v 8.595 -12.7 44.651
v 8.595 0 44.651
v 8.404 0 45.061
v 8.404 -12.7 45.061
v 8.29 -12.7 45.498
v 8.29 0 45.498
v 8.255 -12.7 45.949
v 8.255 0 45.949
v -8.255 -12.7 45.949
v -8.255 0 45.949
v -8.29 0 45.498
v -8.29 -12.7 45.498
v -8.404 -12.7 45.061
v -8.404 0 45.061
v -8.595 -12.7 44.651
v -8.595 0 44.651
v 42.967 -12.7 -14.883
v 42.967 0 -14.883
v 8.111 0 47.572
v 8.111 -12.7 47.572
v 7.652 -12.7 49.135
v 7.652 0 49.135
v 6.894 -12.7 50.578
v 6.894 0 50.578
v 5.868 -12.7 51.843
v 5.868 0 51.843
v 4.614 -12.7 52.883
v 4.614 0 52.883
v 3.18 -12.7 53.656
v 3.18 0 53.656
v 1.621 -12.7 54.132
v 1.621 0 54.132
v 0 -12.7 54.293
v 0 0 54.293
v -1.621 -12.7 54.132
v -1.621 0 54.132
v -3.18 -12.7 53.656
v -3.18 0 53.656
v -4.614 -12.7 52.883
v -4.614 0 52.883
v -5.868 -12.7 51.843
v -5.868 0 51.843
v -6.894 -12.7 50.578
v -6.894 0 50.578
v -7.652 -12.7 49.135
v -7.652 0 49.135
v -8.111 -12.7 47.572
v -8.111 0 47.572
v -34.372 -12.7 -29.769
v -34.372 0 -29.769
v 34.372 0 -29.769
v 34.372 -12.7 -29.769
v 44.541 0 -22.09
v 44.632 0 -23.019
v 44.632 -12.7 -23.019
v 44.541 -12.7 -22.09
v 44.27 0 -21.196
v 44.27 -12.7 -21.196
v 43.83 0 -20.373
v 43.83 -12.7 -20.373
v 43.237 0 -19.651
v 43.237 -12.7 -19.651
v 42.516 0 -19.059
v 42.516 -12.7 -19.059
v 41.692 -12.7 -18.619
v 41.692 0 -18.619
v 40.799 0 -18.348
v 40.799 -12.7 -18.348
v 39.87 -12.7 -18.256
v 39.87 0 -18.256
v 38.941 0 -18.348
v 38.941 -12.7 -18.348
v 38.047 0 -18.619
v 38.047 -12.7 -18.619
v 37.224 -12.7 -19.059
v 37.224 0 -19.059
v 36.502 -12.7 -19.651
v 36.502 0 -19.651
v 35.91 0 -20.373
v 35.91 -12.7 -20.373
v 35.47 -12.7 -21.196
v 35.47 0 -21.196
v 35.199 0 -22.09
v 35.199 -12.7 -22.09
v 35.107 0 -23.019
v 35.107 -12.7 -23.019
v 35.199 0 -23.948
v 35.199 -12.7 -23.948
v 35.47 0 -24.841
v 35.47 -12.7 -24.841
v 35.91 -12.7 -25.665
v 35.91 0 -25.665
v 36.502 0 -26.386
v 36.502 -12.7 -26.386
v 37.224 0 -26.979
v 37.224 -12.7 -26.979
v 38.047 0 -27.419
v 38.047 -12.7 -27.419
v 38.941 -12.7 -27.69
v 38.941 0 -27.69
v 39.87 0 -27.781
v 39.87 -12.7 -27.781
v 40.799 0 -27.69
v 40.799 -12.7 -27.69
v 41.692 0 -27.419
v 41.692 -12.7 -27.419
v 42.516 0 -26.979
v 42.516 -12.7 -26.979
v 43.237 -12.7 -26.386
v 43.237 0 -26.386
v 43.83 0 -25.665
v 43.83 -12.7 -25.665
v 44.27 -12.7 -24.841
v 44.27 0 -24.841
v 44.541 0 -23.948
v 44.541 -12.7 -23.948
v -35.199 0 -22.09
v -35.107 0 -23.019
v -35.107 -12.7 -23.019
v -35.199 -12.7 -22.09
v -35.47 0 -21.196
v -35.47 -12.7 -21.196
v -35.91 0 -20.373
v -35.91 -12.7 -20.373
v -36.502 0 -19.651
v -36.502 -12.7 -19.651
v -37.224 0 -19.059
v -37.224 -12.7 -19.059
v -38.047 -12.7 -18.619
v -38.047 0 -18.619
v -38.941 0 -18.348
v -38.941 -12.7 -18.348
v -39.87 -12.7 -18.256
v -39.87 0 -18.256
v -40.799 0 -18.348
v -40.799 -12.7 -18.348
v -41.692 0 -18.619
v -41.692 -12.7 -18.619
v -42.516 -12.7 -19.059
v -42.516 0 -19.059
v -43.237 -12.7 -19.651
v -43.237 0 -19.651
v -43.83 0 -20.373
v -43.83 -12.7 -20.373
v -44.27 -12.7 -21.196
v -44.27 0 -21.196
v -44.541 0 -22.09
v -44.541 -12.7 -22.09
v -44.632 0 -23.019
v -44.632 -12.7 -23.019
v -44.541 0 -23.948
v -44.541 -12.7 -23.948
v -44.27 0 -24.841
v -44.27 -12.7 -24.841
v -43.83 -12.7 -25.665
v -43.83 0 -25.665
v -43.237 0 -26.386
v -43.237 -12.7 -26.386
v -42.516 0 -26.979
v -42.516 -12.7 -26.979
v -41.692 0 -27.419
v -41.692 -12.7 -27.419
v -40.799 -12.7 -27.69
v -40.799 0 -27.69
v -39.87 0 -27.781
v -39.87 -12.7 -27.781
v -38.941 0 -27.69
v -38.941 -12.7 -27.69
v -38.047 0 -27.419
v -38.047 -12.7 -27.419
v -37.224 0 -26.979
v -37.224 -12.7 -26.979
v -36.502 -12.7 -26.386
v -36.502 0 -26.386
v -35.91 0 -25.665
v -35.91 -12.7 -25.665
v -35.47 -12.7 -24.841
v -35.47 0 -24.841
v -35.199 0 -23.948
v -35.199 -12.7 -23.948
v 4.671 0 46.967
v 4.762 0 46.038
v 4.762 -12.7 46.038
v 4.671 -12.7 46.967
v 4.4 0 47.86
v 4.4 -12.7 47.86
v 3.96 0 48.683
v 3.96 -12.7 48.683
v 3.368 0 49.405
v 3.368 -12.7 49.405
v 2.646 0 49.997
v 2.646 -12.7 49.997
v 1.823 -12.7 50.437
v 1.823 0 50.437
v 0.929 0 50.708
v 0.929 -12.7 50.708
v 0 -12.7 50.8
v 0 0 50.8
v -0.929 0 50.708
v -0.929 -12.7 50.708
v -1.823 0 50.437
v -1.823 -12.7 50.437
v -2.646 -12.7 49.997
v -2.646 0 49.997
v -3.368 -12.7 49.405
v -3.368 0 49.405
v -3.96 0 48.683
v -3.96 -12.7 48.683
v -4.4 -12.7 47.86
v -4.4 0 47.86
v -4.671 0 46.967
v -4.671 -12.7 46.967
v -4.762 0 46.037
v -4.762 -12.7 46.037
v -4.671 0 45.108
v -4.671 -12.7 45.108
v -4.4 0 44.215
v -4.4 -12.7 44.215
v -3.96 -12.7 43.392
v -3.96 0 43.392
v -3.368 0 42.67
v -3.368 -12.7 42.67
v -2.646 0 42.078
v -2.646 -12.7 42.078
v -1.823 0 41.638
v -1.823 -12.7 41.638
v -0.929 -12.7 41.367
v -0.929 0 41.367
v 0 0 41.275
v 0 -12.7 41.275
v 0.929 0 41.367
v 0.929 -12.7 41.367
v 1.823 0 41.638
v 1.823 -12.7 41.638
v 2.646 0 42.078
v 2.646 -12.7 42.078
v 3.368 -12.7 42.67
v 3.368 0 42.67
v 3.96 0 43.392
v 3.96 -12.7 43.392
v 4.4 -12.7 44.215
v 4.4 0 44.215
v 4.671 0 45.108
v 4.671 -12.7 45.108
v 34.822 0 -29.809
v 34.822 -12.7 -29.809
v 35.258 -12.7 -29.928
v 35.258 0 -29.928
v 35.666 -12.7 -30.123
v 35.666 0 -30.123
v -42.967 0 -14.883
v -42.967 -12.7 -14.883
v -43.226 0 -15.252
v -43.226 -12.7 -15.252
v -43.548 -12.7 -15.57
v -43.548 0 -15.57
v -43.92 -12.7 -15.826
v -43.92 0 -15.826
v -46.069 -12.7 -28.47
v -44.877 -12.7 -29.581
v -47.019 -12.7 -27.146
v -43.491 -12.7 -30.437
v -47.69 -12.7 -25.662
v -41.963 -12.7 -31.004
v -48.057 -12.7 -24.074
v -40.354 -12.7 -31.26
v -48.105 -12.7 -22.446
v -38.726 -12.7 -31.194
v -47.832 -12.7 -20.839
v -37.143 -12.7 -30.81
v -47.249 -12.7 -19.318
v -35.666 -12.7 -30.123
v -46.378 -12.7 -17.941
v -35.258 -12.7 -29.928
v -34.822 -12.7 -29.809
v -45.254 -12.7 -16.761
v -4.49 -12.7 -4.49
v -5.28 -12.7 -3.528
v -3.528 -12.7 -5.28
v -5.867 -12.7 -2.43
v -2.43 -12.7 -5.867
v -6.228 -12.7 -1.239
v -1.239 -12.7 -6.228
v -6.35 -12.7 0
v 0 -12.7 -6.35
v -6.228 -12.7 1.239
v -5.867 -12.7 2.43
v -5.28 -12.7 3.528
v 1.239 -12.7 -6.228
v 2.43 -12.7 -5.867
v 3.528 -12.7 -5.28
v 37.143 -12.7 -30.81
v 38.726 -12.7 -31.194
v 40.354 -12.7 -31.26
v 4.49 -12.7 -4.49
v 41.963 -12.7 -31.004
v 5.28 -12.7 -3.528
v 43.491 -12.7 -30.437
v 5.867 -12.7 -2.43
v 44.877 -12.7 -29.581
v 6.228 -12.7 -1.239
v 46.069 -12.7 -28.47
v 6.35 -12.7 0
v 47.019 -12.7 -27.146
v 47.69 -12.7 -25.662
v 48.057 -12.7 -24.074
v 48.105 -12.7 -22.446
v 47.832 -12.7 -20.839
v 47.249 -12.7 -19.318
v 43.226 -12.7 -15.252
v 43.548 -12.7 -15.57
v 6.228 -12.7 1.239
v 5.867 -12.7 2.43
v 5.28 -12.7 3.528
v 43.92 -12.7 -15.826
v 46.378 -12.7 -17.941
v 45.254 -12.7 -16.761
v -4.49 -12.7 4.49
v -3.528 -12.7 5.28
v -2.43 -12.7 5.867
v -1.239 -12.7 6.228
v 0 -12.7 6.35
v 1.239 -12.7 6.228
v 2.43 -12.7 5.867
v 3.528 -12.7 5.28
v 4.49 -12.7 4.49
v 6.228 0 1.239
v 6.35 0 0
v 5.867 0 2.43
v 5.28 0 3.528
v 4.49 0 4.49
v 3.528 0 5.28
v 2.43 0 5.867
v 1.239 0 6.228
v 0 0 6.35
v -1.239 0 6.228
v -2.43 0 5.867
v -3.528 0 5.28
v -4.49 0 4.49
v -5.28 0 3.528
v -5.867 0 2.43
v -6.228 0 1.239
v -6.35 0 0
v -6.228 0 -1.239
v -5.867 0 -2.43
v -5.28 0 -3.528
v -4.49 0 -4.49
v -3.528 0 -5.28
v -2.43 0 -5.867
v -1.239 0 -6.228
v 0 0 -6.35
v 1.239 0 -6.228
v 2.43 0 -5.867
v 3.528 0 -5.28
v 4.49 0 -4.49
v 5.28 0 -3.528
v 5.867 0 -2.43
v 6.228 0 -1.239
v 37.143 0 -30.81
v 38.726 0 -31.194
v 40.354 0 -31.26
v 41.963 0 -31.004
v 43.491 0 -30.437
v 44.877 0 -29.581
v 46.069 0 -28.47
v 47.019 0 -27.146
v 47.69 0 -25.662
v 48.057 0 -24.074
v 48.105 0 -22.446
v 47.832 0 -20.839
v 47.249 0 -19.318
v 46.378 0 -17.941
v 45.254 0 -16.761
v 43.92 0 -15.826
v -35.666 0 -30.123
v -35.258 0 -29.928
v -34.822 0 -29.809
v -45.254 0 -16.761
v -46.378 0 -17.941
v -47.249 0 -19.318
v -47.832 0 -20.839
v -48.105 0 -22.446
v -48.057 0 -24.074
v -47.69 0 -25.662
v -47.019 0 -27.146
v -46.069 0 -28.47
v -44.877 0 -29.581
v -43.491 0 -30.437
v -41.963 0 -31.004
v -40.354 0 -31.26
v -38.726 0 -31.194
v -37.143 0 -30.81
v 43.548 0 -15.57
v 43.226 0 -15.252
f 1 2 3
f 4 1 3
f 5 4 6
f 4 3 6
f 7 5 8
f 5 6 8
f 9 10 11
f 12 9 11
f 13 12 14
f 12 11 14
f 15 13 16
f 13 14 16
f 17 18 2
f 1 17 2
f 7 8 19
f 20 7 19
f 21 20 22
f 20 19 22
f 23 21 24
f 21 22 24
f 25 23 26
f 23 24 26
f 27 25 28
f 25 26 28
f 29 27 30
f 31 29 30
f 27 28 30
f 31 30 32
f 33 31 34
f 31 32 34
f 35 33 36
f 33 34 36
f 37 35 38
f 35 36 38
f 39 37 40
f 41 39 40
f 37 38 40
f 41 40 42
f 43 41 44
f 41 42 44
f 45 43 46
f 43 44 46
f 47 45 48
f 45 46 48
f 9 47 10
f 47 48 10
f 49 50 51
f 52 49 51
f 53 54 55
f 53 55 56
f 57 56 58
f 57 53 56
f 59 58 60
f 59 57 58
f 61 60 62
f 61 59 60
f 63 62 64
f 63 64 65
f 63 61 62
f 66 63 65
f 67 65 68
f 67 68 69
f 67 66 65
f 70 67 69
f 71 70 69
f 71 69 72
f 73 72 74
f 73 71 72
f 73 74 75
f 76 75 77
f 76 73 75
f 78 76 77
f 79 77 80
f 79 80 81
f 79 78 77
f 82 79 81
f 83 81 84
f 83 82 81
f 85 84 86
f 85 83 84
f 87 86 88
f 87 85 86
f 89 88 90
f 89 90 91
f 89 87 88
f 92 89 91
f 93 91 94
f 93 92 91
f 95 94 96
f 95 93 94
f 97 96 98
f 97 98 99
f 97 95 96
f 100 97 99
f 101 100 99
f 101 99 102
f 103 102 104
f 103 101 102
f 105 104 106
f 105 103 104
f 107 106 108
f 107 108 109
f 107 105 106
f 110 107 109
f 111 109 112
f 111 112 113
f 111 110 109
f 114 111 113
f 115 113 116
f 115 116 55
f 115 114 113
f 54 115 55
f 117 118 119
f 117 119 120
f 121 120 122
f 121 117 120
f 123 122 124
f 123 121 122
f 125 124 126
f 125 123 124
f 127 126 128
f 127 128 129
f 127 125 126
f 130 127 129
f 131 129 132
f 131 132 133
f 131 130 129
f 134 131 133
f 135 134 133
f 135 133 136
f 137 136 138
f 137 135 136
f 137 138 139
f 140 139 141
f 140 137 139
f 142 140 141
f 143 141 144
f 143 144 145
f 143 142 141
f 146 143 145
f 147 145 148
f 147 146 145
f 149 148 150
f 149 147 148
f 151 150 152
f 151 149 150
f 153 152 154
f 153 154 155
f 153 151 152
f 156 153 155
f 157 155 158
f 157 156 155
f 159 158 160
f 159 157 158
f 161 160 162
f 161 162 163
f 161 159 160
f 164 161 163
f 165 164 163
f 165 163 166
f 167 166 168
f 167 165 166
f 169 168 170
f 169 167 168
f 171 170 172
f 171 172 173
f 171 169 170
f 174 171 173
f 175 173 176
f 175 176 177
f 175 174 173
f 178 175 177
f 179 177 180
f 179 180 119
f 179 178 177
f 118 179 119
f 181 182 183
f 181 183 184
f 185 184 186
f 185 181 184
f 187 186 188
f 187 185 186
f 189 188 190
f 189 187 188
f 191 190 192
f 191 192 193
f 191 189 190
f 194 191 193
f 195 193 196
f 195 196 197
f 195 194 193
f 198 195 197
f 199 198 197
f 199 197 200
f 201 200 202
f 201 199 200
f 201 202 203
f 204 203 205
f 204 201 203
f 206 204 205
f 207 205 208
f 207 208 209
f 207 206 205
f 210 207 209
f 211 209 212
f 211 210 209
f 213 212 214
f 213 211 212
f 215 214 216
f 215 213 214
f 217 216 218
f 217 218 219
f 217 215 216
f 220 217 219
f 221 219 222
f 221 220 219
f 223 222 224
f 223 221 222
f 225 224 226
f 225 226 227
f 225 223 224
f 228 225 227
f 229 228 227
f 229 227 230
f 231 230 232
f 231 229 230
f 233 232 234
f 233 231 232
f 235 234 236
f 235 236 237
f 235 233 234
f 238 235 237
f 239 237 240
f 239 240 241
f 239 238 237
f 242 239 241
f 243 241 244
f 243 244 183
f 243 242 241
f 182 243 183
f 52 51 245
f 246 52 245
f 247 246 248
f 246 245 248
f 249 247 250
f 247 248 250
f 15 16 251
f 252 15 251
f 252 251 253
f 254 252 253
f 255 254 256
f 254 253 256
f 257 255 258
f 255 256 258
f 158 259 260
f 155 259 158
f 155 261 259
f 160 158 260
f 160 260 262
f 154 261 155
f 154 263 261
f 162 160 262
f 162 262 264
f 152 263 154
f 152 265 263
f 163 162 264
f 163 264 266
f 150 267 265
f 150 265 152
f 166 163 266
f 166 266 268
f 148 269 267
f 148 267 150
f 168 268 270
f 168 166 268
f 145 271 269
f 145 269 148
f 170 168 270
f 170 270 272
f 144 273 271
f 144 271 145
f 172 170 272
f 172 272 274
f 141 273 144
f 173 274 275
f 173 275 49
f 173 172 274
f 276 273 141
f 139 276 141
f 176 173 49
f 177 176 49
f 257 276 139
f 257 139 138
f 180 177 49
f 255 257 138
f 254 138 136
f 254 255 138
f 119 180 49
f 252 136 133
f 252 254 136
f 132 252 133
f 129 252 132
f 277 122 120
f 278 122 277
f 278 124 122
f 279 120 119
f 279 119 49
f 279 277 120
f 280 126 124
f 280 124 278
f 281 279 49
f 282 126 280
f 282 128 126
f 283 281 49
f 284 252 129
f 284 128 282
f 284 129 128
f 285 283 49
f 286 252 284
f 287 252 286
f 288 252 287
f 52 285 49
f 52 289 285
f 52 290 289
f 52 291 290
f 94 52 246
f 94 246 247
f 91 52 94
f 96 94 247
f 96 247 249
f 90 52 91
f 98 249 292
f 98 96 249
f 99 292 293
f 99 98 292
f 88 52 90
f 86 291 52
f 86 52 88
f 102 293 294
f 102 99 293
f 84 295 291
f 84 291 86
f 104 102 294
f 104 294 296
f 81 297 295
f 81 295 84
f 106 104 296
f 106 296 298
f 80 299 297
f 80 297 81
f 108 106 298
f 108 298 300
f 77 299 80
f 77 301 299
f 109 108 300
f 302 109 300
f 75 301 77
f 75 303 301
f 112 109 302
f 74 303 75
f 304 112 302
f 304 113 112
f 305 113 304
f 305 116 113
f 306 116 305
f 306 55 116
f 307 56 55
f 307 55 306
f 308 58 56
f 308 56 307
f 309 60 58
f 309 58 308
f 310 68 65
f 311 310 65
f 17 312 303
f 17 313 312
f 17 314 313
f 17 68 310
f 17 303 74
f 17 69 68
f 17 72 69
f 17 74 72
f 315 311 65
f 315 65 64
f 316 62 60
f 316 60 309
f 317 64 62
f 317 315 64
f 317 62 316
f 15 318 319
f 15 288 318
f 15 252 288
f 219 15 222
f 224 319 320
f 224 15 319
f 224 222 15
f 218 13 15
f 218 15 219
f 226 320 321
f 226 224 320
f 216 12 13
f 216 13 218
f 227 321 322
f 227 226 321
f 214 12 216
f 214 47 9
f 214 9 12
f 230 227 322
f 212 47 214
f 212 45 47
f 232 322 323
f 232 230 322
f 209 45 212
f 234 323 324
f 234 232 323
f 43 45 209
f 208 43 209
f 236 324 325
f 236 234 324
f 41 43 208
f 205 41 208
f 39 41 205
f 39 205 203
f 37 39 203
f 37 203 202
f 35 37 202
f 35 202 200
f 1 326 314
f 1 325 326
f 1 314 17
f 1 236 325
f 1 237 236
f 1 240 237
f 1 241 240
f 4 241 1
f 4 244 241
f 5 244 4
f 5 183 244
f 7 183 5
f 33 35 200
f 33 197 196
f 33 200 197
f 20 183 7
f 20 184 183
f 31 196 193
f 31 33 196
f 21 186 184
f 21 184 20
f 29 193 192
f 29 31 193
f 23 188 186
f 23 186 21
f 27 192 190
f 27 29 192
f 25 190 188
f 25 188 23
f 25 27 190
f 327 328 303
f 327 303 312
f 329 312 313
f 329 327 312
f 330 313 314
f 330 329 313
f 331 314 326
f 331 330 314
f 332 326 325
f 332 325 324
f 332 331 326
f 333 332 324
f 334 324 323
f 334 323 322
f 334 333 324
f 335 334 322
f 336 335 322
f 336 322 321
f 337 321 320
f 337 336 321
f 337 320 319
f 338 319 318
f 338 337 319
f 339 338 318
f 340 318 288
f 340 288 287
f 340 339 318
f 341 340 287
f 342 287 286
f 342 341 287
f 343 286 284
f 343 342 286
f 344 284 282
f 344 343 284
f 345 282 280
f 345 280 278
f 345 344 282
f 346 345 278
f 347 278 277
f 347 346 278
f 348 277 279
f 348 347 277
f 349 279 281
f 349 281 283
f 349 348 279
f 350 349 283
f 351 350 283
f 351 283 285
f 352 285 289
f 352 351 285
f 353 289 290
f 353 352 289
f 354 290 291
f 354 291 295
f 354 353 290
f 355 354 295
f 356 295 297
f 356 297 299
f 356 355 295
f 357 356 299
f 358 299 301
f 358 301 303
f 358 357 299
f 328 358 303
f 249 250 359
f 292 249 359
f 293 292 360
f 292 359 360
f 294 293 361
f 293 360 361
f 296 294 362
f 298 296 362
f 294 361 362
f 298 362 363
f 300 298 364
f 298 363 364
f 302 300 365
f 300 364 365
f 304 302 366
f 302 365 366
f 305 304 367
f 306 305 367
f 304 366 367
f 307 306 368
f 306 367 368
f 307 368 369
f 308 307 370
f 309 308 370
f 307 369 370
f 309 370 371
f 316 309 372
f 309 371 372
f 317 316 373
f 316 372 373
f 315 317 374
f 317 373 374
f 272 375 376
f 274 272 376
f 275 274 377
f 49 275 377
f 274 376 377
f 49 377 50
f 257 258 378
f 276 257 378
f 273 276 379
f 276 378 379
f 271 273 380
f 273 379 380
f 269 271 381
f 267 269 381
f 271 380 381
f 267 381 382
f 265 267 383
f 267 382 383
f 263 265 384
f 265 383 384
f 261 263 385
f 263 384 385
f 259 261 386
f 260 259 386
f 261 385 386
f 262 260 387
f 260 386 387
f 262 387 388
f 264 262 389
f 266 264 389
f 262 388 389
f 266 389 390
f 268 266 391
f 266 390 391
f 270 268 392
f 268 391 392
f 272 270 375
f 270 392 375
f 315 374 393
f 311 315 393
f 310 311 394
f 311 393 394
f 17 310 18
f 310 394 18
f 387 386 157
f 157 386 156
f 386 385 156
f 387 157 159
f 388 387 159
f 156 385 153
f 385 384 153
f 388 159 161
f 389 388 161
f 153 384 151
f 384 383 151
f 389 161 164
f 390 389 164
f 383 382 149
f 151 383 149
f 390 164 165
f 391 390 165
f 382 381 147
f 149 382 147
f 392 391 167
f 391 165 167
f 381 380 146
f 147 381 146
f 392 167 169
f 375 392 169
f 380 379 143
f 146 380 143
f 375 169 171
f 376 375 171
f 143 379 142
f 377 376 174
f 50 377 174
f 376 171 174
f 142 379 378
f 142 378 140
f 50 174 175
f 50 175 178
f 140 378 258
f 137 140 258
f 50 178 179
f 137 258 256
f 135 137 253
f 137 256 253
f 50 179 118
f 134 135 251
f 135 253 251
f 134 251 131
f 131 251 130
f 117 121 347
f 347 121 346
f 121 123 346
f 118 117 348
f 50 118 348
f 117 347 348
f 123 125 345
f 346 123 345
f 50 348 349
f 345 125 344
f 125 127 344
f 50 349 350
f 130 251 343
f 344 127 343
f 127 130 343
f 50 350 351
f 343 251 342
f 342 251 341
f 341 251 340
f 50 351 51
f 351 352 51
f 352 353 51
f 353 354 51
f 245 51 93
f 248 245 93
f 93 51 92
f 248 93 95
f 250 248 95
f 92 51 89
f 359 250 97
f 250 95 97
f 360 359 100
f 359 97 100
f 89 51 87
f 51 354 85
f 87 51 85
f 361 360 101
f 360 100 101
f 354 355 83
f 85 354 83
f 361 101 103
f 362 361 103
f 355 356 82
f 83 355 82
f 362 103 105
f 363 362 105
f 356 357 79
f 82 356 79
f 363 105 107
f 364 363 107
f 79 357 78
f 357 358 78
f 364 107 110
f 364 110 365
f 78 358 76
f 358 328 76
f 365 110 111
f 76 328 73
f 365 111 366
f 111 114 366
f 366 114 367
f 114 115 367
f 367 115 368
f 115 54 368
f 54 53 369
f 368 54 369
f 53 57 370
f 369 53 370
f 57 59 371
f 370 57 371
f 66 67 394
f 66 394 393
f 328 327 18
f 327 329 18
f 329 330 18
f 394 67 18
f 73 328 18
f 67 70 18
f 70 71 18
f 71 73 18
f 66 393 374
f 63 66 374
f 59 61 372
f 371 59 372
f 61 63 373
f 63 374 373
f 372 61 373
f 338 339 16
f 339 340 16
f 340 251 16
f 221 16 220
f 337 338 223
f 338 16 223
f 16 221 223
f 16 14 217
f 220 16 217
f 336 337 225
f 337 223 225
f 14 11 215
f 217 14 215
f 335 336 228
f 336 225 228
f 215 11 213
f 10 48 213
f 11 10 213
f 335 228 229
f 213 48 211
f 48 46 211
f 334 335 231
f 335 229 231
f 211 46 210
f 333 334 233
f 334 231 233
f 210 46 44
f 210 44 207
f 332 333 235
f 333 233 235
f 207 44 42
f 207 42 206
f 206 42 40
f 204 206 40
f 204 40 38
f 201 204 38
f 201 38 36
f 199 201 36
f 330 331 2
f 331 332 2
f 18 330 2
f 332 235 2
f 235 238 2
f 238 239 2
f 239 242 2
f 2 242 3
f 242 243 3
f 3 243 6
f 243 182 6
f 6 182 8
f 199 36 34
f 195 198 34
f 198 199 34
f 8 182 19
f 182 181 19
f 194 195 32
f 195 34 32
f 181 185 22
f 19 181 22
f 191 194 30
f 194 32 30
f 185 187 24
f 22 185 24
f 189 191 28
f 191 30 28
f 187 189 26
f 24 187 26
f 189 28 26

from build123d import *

# Parameters (mm, degrees)
F0_R     = 4.7625
F0_R_2   = 6.35
F1_DEPTH = 12.7


with BuildPart() as f1:
    # F0 (on Front) → F1 (new body)
    with BuildSketch(Plane.XZ):
        with BuildLine():
            ThreePointArc((8.594672, 44.651487), (8.337428, 45.27728), (8.254523, 45.948784))
            ThreePointArc((8.254523, 45.948784), (0, 54.2925), (-8.254523, 45.948784))
            ThreePointArc((-8.254523, 45.948784), (-8.337428, 45.27728), (-8.594672, 44.651487))
            Line((-8.594672, 44.651487), (-42.966658, -14.882539))
            ThreePointArc((-42.966658, -14.882539), (-43.379988, -15.418216), (-43.920076, -15.825765))
            ThreePointArc((-43.920076, -15.825765), (-47.018684, -27.14625), (-35.665553, -30.123019))
            ThreePointArc((-35.665553, -30.123019), (-35.042561, -29.859064), (-34.371986, -29.768948))
            Line((-34.371986, -29.768948), (34.371986, -29.768948))
            ThreePointArc((34.371986, -29.768948), (35.042561, -29.859064), (35.665553, -30.123019))
            ThreePointArc((35.665553, -30.123019), (47.018684, -27.14625), (43.920076, -15.825765))
            ThreePointArc((43.920076, -15.825765), (43.379988, -15.418216), (42.966658, -14.882539))
            Line((42.966658, -14.882539), (8.594672, 44.651487))
        make_face()
        with Locations((-39.869645, -23.01875)):
            Circle(F0_R, mode=Mode.SUBTRACT)
        with Locations((39.869645, -23.01875)):
            Circle(F0_R, mode=Mode.SUBTRACT)
        Circle(F0_R_2, mode=Mode.SUBTRACT)
        with Locations((0, 46.0375)):
            Circle(F0_R, mode=Mode.SUBTRACT)
    extrude(amount=F1_DEPTH)


solid = f1.part
